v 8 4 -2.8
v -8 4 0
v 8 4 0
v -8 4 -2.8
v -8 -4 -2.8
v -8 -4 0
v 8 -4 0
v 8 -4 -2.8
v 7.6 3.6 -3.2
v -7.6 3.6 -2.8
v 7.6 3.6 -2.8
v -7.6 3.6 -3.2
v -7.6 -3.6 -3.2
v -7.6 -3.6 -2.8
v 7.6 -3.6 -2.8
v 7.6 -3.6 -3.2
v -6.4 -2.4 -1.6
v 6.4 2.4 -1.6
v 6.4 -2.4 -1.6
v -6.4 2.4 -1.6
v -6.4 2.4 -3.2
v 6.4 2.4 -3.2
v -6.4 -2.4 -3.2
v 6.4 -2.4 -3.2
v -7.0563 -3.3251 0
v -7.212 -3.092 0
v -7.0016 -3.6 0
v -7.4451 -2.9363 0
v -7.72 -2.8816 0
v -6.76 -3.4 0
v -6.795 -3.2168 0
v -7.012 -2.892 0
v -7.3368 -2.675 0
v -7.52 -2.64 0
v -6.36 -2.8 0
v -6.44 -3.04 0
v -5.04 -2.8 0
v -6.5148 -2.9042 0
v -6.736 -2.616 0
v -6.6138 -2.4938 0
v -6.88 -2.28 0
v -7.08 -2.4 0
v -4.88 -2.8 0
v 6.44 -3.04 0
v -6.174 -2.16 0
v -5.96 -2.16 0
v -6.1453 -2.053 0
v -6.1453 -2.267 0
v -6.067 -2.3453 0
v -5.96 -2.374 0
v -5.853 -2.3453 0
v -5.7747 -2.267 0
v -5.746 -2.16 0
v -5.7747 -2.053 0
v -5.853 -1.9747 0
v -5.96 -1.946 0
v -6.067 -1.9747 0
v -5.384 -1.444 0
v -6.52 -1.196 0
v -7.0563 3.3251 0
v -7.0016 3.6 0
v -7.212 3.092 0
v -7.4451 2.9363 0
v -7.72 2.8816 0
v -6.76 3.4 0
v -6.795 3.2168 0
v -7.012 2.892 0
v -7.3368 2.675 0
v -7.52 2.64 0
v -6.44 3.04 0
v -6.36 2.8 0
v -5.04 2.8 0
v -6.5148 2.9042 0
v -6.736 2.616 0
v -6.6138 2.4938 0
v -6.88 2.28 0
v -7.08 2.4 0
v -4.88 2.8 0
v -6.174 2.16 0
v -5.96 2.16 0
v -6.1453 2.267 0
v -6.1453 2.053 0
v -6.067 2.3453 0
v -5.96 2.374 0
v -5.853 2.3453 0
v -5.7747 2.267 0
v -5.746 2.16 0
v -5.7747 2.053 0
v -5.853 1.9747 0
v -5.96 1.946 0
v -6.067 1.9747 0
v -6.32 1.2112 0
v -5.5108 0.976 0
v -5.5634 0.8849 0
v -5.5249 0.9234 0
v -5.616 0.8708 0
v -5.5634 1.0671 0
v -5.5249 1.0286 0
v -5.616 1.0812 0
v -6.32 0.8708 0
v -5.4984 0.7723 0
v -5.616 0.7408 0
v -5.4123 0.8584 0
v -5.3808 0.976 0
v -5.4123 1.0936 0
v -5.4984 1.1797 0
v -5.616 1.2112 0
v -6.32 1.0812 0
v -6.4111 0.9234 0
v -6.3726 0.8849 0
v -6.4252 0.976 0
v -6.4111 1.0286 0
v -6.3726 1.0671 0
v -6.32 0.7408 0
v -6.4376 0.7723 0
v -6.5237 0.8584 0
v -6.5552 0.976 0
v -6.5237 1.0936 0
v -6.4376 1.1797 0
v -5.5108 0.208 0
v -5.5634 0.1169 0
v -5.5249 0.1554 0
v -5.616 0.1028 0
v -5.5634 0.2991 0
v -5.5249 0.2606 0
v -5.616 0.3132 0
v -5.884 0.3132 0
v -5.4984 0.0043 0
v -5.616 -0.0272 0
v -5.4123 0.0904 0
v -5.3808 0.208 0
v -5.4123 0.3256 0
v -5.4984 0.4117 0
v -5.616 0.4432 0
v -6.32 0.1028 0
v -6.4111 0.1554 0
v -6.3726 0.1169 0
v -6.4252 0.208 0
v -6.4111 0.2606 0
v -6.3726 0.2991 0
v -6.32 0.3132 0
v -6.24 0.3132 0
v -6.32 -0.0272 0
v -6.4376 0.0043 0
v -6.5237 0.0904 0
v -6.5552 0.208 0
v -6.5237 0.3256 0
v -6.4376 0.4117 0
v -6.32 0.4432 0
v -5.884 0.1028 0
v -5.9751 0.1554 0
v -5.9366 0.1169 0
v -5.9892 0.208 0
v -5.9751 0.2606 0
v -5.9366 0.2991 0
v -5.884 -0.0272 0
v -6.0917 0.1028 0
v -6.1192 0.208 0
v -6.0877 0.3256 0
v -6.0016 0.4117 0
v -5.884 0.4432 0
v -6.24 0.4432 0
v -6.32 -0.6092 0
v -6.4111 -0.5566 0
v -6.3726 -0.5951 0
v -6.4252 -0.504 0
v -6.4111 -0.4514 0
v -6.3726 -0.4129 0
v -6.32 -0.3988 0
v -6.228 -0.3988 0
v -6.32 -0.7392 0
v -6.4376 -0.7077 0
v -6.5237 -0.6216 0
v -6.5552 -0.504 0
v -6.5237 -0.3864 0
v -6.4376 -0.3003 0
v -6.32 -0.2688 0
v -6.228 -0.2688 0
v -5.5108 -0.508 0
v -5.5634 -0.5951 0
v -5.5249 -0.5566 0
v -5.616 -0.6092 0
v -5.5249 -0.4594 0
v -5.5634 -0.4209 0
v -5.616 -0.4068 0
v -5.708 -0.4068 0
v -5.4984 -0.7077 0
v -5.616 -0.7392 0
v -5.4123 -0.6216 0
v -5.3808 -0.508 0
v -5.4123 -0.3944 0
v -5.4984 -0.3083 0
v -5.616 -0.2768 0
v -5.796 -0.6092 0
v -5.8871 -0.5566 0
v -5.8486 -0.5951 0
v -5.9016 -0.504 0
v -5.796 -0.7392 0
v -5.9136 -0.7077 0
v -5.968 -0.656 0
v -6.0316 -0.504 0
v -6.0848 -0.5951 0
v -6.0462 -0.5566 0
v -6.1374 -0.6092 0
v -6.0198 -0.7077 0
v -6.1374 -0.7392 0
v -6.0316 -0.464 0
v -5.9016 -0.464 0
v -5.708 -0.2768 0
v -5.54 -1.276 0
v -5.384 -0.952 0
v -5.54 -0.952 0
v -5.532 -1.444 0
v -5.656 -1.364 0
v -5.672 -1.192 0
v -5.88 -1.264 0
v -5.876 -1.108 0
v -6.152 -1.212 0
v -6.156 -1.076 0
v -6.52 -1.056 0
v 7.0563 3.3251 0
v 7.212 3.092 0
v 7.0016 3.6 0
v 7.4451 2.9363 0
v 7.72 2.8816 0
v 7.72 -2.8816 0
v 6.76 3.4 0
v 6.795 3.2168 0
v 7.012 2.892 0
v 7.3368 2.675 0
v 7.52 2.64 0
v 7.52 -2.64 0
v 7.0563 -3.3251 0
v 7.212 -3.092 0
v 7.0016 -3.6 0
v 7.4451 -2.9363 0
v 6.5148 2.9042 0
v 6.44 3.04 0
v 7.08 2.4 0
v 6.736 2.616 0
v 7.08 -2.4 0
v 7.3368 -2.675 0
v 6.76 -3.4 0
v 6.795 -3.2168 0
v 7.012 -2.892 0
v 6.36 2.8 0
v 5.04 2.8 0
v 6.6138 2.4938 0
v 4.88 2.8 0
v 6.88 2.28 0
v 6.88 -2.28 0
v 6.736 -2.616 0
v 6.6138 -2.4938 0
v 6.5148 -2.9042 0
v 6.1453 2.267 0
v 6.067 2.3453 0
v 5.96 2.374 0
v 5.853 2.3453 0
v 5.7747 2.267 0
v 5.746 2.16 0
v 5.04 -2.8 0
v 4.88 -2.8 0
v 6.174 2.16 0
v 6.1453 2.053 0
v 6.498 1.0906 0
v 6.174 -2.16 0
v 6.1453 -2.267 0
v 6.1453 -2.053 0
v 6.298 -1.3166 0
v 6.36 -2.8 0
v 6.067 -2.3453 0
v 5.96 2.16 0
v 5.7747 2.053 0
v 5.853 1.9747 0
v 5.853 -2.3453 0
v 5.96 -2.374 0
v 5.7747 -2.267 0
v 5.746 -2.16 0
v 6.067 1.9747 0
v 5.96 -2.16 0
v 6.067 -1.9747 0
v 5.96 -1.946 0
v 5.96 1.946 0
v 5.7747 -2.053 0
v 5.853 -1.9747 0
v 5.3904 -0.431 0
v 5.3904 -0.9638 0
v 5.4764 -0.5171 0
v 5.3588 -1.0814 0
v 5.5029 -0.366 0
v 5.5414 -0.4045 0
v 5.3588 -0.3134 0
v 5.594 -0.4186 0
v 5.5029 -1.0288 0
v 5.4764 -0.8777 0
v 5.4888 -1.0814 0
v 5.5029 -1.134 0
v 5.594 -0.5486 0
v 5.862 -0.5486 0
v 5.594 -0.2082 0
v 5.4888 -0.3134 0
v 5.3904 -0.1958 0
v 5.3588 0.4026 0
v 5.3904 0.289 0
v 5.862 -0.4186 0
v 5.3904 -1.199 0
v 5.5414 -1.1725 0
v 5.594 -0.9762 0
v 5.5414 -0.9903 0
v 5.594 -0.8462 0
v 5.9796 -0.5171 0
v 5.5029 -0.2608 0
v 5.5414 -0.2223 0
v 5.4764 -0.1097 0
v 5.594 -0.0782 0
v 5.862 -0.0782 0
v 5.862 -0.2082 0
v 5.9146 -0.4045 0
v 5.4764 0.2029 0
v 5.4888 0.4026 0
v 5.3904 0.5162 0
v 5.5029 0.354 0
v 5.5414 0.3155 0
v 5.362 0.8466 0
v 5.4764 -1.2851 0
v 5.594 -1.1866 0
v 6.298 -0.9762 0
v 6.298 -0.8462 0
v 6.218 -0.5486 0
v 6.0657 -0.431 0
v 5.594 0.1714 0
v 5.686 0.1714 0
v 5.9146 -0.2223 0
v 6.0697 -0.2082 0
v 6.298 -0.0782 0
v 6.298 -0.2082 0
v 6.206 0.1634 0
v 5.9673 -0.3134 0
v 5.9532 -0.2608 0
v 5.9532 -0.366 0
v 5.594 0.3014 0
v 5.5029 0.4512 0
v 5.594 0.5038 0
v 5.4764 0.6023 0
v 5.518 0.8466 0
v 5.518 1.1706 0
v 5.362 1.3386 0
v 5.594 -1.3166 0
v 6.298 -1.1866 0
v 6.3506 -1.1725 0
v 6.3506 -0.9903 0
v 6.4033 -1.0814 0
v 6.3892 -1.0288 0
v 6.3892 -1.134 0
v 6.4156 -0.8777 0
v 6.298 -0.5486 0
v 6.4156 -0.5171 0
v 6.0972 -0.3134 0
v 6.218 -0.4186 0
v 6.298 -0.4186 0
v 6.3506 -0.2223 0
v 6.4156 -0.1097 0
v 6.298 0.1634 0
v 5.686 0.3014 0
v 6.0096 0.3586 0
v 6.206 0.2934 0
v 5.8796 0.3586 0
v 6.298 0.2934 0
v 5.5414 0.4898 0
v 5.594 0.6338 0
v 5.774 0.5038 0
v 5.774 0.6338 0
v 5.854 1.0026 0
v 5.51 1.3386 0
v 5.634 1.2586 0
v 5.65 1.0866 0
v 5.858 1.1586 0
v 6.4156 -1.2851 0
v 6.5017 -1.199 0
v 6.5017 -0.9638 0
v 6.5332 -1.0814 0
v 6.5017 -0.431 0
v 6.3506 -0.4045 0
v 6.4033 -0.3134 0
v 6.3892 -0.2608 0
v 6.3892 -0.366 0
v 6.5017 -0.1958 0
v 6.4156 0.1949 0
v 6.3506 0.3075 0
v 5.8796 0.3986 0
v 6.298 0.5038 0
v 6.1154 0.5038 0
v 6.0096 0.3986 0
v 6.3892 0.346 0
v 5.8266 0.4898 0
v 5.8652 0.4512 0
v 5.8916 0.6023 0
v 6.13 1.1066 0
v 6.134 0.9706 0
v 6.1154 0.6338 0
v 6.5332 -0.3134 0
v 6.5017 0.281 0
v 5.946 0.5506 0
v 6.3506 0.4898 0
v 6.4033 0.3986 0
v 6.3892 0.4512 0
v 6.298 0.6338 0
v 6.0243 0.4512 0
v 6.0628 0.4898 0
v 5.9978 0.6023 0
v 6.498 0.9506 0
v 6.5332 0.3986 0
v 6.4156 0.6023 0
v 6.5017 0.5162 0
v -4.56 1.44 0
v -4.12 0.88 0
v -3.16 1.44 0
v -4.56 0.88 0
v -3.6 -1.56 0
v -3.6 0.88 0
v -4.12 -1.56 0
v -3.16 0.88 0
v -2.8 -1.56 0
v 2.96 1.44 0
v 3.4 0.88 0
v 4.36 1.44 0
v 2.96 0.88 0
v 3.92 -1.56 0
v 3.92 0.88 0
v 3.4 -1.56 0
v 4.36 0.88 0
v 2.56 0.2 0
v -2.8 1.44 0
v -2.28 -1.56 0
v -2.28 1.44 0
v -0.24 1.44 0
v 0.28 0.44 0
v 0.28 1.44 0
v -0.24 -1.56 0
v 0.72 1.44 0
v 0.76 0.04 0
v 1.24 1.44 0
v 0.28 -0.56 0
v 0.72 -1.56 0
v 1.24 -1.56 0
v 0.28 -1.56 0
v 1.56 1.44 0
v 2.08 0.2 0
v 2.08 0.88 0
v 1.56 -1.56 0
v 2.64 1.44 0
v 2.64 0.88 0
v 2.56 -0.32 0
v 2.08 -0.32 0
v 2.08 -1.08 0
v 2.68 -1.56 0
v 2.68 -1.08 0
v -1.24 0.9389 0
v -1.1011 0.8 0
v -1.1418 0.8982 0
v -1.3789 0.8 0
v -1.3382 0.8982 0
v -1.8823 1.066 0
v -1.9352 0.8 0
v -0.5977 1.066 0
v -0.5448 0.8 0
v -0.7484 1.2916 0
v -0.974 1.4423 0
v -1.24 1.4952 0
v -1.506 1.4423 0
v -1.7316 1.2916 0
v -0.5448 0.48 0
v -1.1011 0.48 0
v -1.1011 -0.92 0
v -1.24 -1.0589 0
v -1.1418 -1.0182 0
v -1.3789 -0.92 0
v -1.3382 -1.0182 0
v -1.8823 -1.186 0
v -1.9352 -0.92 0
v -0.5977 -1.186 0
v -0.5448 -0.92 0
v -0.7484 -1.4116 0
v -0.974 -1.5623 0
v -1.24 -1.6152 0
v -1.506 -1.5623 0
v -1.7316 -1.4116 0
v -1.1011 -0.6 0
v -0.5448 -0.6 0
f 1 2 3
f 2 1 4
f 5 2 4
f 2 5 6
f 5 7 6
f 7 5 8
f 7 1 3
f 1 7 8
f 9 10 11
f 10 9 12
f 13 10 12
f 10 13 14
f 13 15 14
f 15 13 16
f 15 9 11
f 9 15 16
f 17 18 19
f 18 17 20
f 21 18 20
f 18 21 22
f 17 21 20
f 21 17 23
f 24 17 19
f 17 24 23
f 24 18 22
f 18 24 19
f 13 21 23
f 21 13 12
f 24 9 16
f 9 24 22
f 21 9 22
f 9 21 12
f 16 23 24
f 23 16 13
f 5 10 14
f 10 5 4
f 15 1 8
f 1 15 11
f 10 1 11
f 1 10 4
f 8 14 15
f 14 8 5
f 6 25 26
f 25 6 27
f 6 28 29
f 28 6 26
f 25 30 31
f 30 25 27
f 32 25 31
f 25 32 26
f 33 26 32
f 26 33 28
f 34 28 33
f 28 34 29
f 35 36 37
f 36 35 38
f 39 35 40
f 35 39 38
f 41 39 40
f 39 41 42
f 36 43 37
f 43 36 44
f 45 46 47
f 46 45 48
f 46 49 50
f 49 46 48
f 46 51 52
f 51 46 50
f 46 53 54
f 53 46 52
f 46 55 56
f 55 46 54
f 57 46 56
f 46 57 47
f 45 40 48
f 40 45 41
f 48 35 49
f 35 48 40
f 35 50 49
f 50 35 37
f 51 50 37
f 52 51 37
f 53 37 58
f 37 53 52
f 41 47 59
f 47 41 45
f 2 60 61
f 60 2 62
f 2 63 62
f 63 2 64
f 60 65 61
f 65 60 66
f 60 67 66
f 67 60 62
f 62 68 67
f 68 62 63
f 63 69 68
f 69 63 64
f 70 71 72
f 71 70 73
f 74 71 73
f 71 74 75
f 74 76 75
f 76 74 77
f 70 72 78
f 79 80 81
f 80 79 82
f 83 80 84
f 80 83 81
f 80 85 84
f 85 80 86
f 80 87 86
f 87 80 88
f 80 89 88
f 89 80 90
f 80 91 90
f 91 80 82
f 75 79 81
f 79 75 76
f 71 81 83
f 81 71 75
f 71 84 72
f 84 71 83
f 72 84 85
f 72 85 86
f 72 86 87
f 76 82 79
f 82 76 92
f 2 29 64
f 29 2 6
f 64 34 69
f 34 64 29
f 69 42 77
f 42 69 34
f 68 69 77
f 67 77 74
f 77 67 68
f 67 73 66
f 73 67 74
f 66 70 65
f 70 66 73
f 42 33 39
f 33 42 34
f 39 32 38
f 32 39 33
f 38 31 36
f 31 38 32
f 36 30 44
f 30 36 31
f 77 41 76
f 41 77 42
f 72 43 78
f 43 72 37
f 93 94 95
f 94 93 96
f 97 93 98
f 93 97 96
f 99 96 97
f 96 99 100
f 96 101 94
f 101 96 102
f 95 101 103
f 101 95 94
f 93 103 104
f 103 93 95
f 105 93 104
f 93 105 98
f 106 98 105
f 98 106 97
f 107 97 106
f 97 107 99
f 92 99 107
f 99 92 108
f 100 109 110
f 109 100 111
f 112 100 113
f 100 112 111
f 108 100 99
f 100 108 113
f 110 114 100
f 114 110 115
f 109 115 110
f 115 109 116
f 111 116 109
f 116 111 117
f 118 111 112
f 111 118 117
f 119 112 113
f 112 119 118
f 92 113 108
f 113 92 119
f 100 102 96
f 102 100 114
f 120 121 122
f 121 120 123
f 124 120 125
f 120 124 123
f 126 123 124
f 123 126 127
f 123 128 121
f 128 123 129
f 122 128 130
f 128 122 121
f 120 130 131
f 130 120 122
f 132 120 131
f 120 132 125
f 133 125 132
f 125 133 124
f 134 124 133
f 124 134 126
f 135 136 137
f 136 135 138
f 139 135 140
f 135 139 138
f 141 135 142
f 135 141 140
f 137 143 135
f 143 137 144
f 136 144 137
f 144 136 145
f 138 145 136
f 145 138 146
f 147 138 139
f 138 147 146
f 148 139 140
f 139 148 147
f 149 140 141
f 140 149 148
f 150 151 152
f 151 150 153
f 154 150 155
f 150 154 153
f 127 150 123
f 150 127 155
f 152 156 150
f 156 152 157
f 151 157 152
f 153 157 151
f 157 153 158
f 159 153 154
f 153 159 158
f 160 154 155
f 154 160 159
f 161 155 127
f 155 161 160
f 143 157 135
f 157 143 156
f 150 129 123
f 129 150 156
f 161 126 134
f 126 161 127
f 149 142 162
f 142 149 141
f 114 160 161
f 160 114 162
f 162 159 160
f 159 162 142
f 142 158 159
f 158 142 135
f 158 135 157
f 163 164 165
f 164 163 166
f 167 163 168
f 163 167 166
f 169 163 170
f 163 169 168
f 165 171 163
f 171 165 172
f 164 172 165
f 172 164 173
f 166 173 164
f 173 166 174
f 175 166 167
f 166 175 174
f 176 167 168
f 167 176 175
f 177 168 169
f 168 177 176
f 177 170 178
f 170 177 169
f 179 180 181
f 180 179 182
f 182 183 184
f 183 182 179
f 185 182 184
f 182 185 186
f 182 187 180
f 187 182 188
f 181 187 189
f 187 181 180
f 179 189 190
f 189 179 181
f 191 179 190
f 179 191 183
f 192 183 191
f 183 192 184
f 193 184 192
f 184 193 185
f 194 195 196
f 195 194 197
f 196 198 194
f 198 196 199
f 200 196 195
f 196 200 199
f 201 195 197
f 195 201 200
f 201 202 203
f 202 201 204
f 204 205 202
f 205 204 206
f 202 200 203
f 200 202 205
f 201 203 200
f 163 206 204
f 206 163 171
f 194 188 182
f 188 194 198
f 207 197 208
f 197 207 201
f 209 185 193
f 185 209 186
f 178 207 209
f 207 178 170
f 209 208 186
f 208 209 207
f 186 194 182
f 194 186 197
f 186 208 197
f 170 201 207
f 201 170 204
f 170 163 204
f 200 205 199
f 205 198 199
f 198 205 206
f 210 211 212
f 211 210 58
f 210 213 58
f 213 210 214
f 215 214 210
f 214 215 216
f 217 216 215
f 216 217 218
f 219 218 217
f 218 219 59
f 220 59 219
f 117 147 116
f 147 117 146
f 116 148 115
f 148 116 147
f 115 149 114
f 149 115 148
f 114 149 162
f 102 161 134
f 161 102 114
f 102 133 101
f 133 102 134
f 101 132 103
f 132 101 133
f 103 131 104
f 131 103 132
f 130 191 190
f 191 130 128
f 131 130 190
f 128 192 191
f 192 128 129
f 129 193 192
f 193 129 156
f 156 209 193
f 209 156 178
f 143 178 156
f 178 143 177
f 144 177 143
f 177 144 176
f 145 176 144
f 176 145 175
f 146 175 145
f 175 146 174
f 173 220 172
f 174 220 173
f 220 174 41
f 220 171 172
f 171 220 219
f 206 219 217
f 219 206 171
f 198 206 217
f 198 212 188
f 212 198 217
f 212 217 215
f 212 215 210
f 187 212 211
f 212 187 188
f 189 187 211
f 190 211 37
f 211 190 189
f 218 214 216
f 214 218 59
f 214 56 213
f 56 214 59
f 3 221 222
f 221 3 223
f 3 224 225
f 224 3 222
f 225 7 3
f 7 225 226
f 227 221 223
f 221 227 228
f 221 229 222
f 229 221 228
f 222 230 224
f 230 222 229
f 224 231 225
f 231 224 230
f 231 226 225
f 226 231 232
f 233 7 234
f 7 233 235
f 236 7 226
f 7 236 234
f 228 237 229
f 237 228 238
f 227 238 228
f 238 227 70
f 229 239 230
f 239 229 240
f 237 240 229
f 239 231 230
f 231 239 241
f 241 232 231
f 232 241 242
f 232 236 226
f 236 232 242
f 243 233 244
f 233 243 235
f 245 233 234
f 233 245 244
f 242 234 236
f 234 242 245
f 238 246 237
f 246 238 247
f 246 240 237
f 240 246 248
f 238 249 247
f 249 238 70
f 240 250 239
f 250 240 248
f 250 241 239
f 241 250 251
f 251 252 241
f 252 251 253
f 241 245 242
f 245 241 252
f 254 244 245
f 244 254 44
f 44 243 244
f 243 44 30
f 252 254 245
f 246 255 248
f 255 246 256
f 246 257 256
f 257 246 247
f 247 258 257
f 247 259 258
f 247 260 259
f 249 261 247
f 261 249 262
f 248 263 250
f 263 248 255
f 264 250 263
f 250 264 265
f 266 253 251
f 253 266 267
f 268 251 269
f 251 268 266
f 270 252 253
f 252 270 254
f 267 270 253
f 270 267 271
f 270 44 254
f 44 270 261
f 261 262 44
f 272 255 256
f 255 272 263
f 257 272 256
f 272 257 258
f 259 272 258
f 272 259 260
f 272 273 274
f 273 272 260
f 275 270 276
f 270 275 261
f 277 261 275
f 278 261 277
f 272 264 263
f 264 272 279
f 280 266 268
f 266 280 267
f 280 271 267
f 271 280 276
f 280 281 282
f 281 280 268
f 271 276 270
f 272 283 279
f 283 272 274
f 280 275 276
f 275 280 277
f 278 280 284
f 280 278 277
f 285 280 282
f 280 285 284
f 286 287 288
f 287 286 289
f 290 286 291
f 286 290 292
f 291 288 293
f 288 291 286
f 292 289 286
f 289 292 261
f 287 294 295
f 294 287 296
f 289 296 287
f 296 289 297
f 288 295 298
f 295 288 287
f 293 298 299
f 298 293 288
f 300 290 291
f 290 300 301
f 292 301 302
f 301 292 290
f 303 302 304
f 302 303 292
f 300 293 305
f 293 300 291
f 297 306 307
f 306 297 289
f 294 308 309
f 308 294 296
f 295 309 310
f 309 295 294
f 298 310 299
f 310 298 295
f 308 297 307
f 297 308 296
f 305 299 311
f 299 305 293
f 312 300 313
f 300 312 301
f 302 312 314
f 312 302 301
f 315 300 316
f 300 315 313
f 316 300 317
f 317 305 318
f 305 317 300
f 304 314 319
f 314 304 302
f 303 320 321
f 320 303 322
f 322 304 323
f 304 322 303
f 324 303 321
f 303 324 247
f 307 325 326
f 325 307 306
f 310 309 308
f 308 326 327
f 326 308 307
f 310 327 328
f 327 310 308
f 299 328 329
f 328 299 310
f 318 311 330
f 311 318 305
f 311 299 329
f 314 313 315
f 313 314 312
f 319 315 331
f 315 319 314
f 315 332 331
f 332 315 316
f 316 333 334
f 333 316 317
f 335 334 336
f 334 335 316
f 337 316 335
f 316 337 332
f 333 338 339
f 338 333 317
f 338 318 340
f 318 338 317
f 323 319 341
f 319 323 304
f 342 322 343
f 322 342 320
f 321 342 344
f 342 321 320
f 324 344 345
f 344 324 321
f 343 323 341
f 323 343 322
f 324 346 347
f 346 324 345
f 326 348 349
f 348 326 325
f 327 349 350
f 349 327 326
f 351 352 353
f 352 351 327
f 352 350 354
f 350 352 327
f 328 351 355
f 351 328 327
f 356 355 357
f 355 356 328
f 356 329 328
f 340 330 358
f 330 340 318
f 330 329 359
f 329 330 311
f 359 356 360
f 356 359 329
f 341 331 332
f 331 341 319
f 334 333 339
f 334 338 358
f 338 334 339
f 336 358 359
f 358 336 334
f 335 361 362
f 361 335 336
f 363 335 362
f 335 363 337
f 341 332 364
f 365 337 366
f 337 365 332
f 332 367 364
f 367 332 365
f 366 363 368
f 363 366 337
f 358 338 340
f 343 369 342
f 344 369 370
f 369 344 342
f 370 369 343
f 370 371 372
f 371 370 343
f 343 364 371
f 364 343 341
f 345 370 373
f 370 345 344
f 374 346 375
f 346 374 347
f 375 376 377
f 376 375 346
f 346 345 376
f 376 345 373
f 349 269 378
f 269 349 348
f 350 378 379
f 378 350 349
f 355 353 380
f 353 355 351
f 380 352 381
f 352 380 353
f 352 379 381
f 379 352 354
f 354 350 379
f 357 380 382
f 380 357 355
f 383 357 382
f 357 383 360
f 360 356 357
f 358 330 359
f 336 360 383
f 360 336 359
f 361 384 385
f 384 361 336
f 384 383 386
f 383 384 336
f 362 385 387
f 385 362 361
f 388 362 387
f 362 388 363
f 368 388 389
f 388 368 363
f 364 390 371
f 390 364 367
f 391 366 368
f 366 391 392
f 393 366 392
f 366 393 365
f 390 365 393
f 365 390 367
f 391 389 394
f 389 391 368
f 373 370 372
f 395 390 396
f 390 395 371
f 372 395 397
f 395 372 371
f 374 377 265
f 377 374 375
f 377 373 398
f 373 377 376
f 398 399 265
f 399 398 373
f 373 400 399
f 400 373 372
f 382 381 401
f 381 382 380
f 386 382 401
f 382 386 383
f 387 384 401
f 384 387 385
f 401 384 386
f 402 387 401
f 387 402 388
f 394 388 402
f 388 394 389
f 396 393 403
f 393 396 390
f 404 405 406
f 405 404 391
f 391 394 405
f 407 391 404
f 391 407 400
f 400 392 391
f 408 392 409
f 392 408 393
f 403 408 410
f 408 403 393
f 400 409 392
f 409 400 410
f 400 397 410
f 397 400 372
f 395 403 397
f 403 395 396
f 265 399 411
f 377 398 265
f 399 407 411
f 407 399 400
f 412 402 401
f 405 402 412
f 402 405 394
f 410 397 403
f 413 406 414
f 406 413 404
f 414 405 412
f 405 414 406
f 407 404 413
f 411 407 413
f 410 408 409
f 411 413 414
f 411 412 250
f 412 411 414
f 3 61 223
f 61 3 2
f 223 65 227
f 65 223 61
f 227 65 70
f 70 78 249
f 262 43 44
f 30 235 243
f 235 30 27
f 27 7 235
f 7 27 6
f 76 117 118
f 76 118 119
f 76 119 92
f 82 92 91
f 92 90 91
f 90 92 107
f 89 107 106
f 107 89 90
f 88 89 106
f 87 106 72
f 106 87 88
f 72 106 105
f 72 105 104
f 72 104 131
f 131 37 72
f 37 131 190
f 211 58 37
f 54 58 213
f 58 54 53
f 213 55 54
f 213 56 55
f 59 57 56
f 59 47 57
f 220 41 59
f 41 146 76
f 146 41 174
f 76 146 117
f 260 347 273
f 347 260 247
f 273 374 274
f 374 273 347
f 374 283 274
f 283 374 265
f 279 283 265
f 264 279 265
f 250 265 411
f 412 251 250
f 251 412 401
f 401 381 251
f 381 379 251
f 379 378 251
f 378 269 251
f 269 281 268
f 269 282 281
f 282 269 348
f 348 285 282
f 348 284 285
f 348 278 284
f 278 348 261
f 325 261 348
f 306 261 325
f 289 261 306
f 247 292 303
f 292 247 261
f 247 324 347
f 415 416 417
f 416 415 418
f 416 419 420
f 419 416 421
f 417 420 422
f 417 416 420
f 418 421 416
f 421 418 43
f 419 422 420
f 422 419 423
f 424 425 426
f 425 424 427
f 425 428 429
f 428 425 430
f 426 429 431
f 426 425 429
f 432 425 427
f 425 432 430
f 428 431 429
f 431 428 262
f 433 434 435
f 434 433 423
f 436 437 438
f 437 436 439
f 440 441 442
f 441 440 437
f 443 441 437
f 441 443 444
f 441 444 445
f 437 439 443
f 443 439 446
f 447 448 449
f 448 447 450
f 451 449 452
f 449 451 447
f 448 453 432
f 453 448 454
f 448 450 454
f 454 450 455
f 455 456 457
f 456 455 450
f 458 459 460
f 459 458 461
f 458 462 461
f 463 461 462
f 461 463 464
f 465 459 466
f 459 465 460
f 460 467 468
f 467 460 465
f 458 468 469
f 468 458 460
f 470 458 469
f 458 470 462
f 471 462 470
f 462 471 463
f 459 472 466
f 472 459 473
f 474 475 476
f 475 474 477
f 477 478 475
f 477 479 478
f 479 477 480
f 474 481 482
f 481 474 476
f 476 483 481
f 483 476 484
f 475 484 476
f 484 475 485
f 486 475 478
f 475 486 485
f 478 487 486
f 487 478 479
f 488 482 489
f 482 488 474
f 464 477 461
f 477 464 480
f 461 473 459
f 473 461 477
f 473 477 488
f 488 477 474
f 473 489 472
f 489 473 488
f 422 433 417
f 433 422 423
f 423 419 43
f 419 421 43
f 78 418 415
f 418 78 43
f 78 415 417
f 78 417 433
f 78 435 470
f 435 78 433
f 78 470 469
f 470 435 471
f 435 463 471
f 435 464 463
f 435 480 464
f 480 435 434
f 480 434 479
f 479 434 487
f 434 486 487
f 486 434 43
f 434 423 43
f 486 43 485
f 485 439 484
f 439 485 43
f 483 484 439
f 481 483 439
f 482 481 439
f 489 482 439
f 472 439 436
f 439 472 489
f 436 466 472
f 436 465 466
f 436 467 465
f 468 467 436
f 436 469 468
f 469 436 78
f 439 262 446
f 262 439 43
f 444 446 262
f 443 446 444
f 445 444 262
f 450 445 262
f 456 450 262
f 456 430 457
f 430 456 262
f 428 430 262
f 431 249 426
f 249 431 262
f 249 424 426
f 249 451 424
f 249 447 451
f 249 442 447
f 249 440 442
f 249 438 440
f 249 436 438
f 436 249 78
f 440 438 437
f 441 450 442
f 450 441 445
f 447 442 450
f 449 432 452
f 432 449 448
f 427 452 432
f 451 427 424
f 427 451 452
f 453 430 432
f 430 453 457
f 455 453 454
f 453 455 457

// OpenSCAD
use <../lib.scad>
use <3069bp82.scad>
$fa=1; $fs=0.2;
function ldraw_lib__3069bpt6(realsolid=false) = [
// 0 ~Moved to 3069bp82
// 0 Name: 3069bpt6.dat
// 0 Author: [PTadmin]
// 0 !LDRAW_ORG Part UPDATE 2019-01
// 0 !LICENSE Licensed under CC BY 4.0 : see CAreadme.txt
// 
// 0 BFC CERTIFY CCW
  [0,"BFC","CERTIFY"],
  [0,"BFC","CCW"],
// 
// 0 !HISTORY 2019-06-28 [PTadmin] Official Update 2019-01
// 
// 
// 0 // Tile 1 x 2 with Black "TICKET" and Red "0937" Pattern
// 1 16 0 0 0 1 0 0 0 1 0 0 0 1 3069bp82.dat
  [1,16,0,0,0,1,0,0,0,1,0,0,0,1, ldraw_lib__3069bp82(realsolid)],
];
module ldraw_lib__3069bpt6(step=0, col=false, unit=2/5, alt=false, line=0.2, solid=!$preview)
    makepoly(ldraw_lib__3069bpt6(solid), step=step, col=col, unit=unit, alt=alt, line=line, solid=solid);
ldraw_lib__3069bpt6(line=0.2);
